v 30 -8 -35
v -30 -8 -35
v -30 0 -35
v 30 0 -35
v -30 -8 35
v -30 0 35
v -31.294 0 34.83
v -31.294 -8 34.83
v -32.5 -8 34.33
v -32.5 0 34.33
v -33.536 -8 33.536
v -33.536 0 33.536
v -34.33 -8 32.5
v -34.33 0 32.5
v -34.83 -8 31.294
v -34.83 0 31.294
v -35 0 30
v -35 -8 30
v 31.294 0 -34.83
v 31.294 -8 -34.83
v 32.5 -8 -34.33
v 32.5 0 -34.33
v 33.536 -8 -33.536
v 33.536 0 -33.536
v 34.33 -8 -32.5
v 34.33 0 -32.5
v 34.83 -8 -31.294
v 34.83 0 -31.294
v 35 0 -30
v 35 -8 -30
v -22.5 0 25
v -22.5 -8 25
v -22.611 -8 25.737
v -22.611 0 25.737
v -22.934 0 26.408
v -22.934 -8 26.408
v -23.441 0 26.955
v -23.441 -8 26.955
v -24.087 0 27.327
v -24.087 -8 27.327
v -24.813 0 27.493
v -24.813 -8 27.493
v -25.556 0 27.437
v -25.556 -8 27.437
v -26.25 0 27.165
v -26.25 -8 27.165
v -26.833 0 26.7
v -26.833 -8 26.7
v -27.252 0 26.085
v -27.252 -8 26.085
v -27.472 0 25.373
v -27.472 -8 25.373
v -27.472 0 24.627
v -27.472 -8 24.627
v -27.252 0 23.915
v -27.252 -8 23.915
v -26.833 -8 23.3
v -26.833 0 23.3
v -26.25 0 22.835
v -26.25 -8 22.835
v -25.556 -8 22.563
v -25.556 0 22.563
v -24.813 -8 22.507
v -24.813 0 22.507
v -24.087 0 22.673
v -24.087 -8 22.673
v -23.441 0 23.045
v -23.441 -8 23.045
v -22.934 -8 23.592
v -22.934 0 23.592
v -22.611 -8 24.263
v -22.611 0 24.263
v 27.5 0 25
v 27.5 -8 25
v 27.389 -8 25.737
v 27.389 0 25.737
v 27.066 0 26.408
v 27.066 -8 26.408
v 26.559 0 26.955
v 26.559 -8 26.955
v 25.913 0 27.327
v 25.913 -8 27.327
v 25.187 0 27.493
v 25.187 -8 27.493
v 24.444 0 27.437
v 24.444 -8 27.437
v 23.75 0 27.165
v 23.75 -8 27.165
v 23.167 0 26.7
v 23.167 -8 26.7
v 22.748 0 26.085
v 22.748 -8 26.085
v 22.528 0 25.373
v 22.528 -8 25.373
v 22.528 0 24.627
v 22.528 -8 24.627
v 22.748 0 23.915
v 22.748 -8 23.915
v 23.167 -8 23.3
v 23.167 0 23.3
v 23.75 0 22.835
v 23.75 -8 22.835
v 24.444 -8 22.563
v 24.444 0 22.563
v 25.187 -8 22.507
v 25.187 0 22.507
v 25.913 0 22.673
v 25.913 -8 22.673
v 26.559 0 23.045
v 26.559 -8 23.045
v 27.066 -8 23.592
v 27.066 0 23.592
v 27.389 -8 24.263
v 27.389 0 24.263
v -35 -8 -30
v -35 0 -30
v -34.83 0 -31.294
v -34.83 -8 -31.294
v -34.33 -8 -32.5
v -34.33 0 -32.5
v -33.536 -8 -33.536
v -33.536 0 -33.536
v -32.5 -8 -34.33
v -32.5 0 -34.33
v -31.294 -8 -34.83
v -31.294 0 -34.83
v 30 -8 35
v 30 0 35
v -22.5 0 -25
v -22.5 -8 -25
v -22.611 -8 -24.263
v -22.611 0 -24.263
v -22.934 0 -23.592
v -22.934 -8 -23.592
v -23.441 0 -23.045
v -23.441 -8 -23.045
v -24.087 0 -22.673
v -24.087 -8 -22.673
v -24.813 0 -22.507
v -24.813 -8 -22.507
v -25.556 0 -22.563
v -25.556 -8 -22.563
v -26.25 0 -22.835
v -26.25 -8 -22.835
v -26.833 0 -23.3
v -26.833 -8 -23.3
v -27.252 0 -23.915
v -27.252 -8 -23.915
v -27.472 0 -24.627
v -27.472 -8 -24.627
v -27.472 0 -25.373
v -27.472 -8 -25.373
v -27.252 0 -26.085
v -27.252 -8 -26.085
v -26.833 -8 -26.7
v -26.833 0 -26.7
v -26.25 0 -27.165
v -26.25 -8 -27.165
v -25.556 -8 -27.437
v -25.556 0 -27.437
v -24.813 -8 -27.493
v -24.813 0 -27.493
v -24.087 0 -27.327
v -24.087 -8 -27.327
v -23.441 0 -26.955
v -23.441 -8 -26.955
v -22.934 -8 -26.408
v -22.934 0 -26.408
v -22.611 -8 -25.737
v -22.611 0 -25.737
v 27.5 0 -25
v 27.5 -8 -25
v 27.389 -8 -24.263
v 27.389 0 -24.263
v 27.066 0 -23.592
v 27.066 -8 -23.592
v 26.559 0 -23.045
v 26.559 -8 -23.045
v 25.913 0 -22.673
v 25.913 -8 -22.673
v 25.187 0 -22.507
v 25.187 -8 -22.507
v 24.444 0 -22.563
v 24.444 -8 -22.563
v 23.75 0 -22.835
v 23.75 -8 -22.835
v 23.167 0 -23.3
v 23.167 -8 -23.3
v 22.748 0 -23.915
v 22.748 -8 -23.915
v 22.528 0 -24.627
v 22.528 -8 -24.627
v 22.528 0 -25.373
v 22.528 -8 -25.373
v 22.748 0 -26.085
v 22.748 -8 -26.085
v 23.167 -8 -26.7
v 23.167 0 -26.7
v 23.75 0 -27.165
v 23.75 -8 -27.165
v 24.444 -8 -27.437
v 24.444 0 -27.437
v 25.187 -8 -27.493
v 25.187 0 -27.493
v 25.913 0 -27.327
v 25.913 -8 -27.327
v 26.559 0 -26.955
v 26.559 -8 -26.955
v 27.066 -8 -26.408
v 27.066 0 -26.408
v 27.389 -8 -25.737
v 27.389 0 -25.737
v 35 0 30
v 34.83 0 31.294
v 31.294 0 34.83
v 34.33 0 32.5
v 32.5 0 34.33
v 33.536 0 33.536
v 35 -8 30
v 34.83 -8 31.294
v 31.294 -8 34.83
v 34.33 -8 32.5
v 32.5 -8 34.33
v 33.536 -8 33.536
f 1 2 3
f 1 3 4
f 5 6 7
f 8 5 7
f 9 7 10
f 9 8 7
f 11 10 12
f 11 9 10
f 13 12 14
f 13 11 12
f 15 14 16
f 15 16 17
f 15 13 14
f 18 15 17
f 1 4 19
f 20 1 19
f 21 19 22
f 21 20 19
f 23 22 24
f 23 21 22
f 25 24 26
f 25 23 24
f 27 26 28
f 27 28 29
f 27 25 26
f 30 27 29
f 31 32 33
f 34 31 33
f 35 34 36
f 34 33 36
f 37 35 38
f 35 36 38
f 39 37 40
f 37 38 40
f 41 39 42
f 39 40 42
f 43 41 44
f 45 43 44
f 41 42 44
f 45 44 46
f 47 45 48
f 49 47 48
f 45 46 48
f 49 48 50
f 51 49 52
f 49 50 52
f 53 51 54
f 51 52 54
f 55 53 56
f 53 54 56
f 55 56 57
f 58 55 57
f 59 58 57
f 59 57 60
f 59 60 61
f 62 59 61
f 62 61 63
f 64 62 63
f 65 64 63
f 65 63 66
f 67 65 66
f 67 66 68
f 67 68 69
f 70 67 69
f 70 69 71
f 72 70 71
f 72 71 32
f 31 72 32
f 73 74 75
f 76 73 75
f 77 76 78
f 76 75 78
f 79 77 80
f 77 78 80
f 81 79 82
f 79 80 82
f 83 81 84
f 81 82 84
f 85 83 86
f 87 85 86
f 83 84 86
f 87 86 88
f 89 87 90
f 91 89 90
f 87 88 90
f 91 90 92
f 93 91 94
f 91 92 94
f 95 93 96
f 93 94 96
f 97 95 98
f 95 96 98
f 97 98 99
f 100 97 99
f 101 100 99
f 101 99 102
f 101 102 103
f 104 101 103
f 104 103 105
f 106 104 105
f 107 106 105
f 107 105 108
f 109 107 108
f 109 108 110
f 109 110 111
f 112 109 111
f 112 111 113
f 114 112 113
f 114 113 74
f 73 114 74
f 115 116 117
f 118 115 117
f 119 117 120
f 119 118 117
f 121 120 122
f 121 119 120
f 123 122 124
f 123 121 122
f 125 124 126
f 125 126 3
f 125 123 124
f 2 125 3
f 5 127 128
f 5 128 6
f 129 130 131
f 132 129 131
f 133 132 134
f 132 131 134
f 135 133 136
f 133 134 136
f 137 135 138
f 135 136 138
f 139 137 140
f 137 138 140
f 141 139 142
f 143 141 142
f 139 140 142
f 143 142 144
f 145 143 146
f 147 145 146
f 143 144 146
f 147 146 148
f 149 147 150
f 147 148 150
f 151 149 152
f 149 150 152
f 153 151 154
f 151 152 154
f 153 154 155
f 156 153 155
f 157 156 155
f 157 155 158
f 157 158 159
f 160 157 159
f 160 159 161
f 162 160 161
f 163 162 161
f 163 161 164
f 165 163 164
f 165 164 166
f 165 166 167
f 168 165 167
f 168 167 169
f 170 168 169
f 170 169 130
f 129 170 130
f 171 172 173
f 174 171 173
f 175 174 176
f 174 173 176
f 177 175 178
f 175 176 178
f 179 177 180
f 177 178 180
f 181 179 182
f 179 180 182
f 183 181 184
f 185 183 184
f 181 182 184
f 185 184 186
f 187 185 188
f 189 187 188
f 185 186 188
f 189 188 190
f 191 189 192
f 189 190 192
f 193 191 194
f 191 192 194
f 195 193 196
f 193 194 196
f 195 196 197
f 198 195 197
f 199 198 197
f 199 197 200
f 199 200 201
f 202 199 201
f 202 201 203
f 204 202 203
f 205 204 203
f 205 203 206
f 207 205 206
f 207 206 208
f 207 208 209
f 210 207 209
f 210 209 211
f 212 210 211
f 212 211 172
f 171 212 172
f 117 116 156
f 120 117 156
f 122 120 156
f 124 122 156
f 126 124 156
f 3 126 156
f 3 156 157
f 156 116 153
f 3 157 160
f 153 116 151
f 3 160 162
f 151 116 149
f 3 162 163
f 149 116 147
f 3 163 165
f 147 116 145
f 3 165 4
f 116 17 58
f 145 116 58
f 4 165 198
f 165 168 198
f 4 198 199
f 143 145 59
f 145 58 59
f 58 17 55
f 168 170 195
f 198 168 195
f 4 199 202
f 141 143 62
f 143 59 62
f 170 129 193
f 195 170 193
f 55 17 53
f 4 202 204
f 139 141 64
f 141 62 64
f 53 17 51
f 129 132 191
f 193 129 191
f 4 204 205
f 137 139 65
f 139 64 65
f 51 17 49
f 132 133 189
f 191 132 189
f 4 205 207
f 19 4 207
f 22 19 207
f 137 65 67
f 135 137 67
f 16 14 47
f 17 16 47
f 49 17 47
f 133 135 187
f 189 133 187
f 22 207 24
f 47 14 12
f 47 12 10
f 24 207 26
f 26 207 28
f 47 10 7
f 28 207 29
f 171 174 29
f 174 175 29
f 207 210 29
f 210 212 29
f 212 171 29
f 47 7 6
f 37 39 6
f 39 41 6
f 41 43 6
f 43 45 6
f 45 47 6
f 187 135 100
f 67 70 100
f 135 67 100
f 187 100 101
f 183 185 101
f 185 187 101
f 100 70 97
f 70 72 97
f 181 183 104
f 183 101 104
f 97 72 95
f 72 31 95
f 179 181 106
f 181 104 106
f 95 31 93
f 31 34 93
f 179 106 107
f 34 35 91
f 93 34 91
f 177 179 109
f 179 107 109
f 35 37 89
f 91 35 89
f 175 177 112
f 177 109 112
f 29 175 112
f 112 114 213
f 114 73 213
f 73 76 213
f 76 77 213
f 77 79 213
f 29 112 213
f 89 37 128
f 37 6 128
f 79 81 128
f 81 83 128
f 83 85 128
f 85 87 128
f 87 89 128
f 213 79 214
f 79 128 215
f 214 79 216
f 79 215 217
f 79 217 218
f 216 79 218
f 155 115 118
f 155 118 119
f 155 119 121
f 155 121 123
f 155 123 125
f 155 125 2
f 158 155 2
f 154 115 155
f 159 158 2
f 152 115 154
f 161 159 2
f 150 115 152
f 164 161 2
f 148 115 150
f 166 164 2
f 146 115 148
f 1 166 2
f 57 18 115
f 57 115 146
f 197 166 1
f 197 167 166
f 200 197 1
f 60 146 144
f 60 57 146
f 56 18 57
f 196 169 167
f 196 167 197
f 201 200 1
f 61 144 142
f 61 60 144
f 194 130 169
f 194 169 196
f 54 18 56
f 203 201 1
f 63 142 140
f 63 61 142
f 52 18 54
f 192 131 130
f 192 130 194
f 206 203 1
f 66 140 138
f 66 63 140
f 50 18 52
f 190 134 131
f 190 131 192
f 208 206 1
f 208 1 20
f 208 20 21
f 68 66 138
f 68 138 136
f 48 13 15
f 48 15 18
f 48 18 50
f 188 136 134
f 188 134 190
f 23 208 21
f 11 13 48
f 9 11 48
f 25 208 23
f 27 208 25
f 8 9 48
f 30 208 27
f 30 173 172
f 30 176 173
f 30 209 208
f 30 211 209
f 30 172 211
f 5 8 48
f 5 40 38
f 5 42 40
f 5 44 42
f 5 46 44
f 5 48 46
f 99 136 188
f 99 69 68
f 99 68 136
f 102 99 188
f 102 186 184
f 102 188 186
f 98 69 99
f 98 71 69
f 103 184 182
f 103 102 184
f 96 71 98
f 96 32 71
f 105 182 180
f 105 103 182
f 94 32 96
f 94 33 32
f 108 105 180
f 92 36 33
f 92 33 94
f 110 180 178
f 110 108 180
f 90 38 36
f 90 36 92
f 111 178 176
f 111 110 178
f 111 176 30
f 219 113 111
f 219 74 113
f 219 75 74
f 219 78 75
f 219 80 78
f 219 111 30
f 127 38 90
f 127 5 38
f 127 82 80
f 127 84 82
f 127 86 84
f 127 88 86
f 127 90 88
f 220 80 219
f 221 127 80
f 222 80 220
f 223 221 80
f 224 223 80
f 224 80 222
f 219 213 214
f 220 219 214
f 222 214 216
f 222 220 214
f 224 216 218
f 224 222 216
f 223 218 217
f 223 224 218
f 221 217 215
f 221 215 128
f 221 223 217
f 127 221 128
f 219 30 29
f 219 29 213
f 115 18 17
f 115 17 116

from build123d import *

# Parameters (mm, degrees)
F0_R     = 2.5
F1_DEPTH = 4


# Not quite as in the source:
# - a pattern or mirror of a feature is missing from the dataset's text; its kind, count and spacing are read off the source's solid


with BuildPart() as f1:
    # F0 (on Front) → F1 (new body)
    with BuildSketch(Plane.XZ):
        with BuildLine():
            Line((30, 35), (-30, 35))
            ThreePointArc((-30, 35), (-33.5355339059, 33.5355339059), (-35, 30))
            Line((-35, 30), (-35, -30))
            ThreePointArc((-35, -30), (-33.5355339059, -33.5355339059), (-30, -35))
            Line((-30, -35), (30, -35))
            ThreePointArc((30, -35), (33.5355339059, -33.5355339059), (35, -30))
            Line((35, -30), (35, 30))
            ThreePointArc((35, 30), (33.5355339059, 33.5355339059), (30, 35))
        make_face()
        with Locations((-25, -25)):
            Circle(F0_R, mode=Mode.SUBTRACT)
        with Locations((25, -25)):
            Circle(F0_R, mode=Mode.SUBTRACT)
        with Locations((-25, 25)):
            Circle(F0_R, mode=Mode.SUBTRACT)
        with Locations((25, 25)):
            Circle(F0_R, mode=Mode.SUBTRACT)
    extrude(amount=F1_DEPTH)

    # F1_copies: F1 across plane


with BuildPart() as f1_1:
    add(f1.part)
    add(f1.part.mirror(Plane(origin=(0, -4, 0), x_dir=(0, 0, -1), z_dir=(0, -1, 0))))


solid = f1_1.part
